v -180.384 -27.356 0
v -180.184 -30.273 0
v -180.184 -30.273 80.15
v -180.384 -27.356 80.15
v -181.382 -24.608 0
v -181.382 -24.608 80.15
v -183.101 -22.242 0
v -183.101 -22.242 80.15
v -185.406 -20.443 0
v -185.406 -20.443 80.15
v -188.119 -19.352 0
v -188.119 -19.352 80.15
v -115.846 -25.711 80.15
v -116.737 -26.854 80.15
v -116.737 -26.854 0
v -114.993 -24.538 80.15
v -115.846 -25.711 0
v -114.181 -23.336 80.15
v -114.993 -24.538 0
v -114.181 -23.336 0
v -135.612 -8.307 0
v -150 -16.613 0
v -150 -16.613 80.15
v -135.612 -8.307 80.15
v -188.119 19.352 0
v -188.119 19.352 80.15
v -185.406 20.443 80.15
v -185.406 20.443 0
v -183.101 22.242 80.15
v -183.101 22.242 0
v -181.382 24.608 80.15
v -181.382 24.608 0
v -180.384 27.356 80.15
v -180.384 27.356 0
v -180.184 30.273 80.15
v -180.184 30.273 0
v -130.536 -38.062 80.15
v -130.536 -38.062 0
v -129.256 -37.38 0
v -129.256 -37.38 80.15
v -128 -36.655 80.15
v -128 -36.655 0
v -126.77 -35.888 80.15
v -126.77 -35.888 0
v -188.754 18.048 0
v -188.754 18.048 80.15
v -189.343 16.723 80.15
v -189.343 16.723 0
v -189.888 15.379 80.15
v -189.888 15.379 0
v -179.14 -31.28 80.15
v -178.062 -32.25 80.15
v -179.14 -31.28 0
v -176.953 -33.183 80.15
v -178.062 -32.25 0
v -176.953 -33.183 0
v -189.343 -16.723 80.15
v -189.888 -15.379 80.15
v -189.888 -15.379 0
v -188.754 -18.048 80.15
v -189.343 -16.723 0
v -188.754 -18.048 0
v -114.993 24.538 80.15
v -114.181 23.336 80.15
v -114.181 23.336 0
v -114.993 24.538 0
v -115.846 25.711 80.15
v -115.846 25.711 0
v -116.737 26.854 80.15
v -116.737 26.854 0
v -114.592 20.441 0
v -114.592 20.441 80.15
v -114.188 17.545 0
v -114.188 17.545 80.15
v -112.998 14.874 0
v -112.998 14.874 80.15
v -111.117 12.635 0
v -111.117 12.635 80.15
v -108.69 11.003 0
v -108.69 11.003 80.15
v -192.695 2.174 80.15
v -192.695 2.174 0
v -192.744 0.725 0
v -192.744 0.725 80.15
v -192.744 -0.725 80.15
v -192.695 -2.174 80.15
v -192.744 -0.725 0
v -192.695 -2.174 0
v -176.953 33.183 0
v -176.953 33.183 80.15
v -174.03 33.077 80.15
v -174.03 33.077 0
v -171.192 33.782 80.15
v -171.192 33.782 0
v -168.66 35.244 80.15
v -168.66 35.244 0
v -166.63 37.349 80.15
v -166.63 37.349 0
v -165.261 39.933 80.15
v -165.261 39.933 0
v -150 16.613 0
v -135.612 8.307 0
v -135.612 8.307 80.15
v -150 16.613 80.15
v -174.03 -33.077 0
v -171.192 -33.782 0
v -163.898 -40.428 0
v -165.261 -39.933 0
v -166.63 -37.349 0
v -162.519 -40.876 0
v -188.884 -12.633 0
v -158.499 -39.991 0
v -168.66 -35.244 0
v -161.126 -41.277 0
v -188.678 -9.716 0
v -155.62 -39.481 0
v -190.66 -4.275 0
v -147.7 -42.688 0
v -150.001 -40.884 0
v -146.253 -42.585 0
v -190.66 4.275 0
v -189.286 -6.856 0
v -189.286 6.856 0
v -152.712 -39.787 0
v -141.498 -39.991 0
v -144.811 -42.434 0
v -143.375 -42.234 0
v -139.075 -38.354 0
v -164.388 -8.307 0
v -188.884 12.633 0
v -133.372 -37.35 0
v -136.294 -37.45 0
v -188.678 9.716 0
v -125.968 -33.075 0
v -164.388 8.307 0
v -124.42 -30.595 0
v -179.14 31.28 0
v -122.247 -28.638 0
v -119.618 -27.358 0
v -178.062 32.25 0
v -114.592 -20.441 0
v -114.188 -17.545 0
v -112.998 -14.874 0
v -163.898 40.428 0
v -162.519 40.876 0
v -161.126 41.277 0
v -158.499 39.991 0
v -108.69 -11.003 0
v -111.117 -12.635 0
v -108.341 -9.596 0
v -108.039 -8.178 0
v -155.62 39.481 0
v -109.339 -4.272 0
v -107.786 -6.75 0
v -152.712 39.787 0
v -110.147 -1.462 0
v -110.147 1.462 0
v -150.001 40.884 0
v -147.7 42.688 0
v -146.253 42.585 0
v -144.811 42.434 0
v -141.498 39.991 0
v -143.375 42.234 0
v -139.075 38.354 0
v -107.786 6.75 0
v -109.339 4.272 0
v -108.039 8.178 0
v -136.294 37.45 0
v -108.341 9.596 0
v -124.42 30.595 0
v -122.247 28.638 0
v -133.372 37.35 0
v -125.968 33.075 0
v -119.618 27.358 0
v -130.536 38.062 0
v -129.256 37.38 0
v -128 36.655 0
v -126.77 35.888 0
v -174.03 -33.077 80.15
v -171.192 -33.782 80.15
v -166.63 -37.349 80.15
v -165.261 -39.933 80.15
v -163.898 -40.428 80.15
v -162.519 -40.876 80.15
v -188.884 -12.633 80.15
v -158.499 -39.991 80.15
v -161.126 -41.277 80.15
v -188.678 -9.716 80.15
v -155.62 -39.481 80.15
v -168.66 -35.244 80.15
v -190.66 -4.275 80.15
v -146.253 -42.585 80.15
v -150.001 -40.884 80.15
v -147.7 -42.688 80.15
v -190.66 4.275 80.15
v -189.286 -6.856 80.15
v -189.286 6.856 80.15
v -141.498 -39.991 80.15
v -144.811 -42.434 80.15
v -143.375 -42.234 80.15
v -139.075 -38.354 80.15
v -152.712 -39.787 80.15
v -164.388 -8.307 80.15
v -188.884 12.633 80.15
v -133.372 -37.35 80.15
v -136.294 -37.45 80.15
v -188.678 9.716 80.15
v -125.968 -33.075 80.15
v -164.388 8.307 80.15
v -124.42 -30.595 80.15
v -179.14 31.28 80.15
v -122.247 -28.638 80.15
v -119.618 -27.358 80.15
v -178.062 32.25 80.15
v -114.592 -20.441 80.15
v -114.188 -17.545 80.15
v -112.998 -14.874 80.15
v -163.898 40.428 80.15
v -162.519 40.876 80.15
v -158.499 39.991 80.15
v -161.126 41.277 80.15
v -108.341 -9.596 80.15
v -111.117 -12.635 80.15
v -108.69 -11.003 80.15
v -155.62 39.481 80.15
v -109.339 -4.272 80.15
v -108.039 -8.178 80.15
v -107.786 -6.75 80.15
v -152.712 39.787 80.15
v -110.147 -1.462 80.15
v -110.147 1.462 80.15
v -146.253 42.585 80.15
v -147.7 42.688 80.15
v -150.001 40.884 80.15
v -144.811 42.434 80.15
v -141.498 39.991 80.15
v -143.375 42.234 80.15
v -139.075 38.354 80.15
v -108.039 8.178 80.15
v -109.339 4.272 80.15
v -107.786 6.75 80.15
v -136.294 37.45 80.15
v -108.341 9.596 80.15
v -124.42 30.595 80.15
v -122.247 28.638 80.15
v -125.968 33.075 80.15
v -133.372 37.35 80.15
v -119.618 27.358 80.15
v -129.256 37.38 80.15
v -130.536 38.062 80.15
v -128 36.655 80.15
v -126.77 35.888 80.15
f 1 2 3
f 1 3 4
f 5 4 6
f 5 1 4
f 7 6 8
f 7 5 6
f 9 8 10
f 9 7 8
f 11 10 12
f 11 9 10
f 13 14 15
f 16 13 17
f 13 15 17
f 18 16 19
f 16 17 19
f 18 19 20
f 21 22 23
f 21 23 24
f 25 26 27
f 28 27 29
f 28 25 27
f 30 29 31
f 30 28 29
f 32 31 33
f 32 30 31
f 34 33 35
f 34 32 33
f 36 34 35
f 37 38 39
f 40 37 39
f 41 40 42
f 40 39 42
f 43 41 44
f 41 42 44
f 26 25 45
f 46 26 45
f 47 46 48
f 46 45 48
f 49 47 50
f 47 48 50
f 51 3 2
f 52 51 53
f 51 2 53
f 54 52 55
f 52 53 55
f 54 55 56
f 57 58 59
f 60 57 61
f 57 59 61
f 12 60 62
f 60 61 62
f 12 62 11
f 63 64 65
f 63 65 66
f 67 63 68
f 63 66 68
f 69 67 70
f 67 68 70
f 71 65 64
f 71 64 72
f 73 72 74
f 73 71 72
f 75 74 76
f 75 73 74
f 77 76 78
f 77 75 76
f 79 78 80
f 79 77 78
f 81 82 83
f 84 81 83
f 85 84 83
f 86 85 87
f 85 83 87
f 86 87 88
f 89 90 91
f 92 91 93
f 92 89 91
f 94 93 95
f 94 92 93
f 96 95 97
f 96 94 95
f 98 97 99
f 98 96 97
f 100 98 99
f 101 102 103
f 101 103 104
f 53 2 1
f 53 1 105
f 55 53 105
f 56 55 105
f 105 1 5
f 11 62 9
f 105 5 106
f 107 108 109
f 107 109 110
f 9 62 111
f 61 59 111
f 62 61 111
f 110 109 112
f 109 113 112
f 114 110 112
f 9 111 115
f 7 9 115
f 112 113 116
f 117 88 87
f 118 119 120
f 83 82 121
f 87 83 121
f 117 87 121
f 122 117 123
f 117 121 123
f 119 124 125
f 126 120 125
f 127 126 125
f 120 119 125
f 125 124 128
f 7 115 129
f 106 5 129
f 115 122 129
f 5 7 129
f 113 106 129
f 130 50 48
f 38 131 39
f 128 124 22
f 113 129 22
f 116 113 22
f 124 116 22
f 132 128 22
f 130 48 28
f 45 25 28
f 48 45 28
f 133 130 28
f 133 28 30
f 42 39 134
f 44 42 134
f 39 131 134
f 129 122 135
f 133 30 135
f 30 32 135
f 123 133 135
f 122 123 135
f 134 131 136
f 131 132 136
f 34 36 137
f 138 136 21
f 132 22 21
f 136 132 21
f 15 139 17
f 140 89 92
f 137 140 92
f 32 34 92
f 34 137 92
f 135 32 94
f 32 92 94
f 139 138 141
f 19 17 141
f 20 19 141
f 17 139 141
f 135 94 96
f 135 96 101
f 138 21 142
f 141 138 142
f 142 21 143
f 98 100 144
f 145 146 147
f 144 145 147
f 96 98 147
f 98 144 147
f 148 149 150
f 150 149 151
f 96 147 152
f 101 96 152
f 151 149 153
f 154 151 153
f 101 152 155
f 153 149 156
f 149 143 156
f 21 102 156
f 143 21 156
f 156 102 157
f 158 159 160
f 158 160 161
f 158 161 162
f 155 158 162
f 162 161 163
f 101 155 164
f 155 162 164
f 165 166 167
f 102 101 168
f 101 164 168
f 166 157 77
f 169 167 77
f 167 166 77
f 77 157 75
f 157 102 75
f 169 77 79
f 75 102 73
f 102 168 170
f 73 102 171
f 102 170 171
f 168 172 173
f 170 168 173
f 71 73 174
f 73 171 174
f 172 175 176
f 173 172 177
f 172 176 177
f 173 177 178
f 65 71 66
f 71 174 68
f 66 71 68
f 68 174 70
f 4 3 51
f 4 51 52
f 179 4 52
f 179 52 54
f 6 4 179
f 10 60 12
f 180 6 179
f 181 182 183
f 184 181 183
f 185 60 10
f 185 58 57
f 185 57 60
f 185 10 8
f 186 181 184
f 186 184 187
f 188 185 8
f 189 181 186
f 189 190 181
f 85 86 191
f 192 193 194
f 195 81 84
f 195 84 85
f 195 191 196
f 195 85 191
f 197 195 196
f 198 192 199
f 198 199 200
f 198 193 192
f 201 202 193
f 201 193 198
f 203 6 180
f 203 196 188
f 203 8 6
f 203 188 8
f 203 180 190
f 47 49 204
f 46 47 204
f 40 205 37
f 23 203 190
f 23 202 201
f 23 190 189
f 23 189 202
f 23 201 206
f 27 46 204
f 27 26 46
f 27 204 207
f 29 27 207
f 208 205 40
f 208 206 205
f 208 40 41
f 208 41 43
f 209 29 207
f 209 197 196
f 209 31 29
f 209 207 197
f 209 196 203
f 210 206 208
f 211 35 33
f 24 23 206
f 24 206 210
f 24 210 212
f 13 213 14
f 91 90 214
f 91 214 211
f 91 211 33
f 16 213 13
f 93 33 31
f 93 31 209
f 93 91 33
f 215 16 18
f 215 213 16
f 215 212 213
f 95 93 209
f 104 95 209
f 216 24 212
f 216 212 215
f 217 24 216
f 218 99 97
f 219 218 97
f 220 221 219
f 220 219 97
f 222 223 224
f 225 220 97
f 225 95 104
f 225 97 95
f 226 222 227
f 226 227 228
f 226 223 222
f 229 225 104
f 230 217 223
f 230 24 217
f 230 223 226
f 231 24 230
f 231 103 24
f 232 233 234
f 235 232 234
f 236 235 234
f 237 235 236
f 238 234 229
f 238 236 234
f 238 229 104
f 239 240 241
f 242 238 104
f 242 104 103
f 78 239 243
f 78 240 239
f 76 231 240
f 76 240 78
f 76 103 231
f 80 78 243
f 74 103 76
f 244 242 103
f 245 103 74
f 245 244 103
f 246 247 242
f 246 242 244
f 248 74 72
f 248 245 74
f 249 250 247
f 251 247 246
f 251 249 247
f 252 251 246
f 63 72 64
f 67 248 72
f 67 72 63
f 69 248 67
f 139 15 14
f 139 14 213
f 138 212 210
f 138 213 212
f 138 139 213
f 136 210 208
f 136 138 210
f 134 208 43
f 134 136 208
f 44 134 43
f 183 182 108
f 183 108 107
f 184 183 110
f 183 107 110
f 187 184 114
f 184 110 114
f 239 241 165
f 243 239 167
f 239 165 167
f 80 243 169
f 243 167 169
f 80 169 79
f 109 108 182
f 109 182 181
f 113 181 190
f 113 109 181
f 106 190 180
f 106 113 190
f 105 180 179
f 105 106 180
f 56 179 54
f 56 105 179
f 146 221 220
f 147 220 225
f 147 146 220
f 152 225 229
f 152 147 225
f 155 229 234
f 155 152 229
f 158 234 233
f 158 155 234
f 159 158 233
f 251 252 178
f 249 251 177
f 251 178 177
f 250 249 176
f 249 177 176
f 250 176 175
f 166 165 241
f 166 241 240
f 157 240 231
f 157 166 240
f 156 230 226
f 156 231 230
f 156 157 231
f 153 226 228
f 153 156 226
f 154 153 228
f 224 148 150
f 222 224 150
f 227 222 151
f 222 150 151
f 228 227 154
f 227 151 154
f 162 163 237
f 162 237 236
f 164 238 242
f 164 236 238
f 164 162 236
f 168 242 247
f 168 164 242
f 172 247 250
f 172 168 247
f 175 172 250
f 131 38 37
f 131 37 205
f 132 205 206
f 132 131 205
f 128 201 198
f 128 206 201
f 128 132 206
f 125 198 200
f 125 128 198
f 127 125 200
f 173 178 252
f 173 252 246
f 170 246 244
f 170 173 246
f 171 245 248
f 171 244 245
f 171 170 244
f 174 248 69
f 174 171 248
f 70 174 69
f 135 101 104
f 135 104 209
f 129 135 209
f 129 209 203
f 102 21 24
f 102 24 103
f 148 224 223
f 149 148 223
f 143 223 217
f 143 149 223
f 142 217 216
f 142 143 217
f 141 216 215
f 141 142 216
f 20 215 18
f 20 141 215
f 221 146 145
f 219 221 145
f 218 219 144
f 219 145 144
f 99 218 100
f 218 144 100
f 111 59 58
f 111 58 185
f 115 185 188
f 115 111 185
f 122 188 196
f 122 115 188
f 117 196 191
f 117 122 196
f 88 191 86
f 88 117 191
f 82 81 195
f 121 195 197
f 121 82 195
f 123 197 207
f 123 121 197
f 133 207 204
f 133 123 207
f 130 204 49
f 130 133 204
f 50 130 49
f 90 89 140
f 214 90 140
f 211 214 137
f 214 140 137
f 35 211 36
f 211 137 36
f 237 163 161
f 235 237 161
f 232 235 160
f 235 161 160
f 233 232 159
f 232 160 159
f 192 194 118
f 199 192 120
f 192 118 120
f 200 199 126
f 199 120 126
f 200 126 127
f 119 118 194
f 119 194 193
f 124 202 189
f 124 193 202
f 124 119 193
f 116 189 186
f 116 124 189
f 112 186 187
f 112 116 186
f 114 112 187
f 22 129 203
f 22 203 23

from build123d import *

# Parameters (mm, degrees)
SKETCH004_R           = 42.75
PAD005_DEPTH          = 80.15
SKETCH005_R           = 10.478477
POCKET004_DEPTH       = 370.285607
POLARPATTERN004_COUNT = 15
POCKET016_DEPTH       = 80.151


with BuildPart() as part:
    # Sketch004 → Pad005 (new body)
    with BuildSketch(Plane.XY):
        Circle(SKETCH004_R)
    extrude(amount=PAD005_DEPTH)

    # Sketch005 → Pocket004 (cut, through all)
    with BuildSketch(Plane.XY):
        with Locations((50.228477, 0)):
            Circle(SKETCH005_R)
    pocket004 = extrude(amount=POCKET004_DEPTH, mode=Mode.SUBTRACT)

    # PolarPattern004: Pocket004 ×15 about axis
    polarpattern004_axis = Axis((0, 0, 0), (0, 0, 1))
    for i in range(1, POLARPATTERN004_COUNT):
        add(pocket004.rotate(polarpattern004_axis, i * 360 / POLARPATTERN004_COUNT), mode=Mode.SUBTRACT)

    # Sketch031 → Pocket016 (cut, through all)
    with BuildSketch(Plane.XY):
        Polygon((14.3875, 8.306627), (0, 16.613254), (-14.3875, 8.306627), (-14.3875, -8.306627), (0, -16.613254), (14.3875, -8.306627), align=None)
    extrude(amount=POCKET016_DEPTH, mode=Mode.SUBTRACT)


with BuildPart() as part_1:
    # Body010 placement: moved
    add(part.part.moved(Location((-150, 0, 0))))


solid = part_1.part
